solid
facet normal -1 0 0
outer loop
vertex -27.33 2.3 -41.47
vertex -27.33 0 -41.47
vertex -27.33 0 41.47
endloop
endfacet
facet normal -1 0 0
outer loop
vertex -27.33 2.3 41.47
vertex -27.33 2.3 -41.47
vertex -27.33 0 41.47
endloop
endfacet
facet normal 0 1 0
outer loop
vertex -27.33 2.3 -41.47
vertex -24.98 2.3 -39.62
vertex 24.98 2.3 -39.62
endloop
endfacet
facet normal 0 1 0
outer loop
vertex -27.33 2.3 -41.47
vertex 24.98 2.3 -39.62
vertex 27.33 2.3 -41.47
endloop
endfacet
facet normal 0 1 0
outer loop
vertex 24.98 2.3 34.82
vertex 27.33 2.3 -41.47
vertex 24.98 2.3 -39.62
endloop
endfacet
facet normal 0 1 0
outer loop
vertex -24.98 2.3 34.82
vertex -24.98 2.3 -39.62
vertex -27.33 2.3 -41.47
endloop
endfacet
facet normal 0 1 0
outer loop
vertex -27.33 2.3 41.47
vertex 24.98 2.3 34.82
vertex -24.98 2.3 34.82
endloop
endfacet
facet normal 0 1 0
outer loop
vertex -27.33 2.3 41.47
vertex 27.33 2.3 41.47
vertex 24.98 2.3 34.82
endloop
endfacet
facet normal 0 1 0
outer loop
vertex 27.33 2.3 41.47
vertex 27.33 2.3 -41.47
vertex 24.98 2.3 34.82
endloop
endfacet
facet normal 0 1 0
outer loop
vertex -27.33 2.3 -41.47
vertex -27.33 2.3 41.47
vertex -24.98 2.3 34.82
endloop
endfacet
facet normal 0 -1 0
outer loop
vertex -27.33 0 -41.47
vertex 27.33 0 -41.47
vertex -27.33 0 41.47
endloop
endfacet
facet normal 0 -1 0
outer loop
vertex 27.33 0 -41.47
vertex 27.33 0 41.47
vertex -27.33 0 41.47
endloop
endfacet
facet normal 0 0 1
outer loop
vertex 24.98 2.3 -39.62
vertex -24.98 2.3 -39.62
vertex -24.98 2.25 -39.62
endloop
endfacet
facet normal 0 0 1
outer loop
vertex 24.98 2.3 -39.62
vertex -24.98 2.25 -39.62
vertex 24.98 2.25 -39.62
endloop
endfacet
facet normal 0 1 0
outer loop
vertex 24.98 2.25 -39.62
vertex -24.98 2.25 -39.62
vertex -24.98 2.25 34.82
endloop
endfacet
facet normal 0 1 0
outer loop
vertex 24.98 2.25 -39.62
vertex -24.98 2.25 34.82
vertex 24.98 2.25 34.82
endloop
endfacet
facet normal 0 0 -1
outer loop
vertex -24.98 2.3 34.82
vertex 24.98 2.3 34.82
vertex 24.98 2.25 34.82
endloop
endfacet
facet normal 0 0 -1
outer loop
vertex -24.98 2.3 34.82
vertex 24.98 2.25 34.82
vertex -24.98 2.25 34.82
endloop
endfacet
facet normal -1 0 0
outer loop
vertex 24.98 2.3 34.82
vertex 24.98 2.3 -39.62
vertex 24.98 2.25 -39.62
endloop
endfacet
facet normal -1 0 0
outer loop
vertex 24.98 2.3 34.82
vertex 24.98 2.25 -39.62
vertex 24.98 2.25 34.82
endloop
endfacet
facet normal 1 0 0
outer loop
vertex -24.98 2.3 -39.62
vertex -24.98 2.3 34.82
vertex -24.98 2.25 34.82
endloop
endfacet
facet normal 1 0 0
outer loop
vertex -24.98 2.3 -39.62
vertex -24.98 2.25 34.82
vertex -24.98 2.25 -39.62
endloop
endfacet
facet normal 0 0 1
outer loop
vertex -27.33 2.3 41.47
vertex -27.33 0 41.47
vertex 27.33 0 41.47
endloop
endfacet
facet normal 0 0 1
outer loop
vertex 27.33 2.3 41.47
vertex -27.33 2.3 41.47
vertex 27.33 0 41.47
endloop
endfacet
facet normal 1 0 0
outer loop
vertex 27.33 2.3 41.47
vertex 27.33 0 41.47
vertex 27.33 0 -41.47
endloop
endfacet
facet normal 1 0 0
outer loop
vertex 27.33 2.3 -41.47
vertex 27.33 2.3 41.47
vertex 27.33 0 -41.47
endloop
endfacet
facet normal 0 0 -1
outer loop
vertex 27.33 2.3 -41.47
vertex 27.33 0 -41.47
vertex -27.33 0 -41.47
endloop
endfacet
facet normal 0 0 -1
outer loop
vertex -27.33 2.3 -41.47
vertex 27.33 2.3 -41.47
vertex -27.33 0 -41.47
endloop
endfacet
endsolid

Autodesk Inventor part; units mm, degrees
ref_plane "YZ Plane" through (0, 0, 0) normal (1, 0, 0) x (0, 1, 0)
ref_plane "XZ Plane" through (0, 0, 0) normal (0, 1, 0) x (-1, 0, 0)
sketch "Sketch1" plane through (0, 0, 0) normal (0, 1, 0) x (-1, 0, 0)
  line L0 (27.33, 41.47) -> (-27.33, 41.47)
  line L1 (-27.33, 41.47) -> (-27.33, -41.47)
  line L2 (-27.33, -41.47) -> (27.33, -41.47)
  line L3 (27.33, -41.47) -> (27.33, 41.47)
  line L4 (27.33, 41.47) -> (-27.33, -41.47) construction
  line L5 (-27.33, 41.47) -> (27.33, -41.47) construction
  point P0 (0, 0)
  dimension "d0" = 82.94
  dimension "d1" = 54.66
extrude "Extrusion1" add sketch "Sketch1" along normal blind 2.3
sketch "Sketch2" plane through (0, 2.3, 0) normal (0, 1, 0) x (1, 0, 0)
  line L0 (-24.98, 39.62) -> (24.98, 39.62)
  line L1 (24.98, 39.62) -> (24.98, -34.82)
  line L2 (24.98, -34.82) -> (-24.98, -34.82)
  line L3 (-24.98, -34.82) -> (-24.98, 39.62)
  line L4 (-24.98, 39.62) -> (24.98, -34.82) construction
  line L5 (24.98, 39.62) -> (-24.98, -34.82) construction
  line L6 (27.33, 41.47) -> (-27.33, 41.47) projected
  point P0 (0, 0)
  point P1 (0, 2.4)
  dimension "d4" = 74.44
  dimension "d5" = 49.96
  dimension "d6" = 1.85
extrude "Extrusion2" cut sketch "Sketch2" against normal blind 0.05
ref_plane "MidPlane" through (0, 2.3, -2.4) normal (0, 0, 1) x (1, 0, 0)
properties part number "Multi-Inno_3.5in_LCD"
